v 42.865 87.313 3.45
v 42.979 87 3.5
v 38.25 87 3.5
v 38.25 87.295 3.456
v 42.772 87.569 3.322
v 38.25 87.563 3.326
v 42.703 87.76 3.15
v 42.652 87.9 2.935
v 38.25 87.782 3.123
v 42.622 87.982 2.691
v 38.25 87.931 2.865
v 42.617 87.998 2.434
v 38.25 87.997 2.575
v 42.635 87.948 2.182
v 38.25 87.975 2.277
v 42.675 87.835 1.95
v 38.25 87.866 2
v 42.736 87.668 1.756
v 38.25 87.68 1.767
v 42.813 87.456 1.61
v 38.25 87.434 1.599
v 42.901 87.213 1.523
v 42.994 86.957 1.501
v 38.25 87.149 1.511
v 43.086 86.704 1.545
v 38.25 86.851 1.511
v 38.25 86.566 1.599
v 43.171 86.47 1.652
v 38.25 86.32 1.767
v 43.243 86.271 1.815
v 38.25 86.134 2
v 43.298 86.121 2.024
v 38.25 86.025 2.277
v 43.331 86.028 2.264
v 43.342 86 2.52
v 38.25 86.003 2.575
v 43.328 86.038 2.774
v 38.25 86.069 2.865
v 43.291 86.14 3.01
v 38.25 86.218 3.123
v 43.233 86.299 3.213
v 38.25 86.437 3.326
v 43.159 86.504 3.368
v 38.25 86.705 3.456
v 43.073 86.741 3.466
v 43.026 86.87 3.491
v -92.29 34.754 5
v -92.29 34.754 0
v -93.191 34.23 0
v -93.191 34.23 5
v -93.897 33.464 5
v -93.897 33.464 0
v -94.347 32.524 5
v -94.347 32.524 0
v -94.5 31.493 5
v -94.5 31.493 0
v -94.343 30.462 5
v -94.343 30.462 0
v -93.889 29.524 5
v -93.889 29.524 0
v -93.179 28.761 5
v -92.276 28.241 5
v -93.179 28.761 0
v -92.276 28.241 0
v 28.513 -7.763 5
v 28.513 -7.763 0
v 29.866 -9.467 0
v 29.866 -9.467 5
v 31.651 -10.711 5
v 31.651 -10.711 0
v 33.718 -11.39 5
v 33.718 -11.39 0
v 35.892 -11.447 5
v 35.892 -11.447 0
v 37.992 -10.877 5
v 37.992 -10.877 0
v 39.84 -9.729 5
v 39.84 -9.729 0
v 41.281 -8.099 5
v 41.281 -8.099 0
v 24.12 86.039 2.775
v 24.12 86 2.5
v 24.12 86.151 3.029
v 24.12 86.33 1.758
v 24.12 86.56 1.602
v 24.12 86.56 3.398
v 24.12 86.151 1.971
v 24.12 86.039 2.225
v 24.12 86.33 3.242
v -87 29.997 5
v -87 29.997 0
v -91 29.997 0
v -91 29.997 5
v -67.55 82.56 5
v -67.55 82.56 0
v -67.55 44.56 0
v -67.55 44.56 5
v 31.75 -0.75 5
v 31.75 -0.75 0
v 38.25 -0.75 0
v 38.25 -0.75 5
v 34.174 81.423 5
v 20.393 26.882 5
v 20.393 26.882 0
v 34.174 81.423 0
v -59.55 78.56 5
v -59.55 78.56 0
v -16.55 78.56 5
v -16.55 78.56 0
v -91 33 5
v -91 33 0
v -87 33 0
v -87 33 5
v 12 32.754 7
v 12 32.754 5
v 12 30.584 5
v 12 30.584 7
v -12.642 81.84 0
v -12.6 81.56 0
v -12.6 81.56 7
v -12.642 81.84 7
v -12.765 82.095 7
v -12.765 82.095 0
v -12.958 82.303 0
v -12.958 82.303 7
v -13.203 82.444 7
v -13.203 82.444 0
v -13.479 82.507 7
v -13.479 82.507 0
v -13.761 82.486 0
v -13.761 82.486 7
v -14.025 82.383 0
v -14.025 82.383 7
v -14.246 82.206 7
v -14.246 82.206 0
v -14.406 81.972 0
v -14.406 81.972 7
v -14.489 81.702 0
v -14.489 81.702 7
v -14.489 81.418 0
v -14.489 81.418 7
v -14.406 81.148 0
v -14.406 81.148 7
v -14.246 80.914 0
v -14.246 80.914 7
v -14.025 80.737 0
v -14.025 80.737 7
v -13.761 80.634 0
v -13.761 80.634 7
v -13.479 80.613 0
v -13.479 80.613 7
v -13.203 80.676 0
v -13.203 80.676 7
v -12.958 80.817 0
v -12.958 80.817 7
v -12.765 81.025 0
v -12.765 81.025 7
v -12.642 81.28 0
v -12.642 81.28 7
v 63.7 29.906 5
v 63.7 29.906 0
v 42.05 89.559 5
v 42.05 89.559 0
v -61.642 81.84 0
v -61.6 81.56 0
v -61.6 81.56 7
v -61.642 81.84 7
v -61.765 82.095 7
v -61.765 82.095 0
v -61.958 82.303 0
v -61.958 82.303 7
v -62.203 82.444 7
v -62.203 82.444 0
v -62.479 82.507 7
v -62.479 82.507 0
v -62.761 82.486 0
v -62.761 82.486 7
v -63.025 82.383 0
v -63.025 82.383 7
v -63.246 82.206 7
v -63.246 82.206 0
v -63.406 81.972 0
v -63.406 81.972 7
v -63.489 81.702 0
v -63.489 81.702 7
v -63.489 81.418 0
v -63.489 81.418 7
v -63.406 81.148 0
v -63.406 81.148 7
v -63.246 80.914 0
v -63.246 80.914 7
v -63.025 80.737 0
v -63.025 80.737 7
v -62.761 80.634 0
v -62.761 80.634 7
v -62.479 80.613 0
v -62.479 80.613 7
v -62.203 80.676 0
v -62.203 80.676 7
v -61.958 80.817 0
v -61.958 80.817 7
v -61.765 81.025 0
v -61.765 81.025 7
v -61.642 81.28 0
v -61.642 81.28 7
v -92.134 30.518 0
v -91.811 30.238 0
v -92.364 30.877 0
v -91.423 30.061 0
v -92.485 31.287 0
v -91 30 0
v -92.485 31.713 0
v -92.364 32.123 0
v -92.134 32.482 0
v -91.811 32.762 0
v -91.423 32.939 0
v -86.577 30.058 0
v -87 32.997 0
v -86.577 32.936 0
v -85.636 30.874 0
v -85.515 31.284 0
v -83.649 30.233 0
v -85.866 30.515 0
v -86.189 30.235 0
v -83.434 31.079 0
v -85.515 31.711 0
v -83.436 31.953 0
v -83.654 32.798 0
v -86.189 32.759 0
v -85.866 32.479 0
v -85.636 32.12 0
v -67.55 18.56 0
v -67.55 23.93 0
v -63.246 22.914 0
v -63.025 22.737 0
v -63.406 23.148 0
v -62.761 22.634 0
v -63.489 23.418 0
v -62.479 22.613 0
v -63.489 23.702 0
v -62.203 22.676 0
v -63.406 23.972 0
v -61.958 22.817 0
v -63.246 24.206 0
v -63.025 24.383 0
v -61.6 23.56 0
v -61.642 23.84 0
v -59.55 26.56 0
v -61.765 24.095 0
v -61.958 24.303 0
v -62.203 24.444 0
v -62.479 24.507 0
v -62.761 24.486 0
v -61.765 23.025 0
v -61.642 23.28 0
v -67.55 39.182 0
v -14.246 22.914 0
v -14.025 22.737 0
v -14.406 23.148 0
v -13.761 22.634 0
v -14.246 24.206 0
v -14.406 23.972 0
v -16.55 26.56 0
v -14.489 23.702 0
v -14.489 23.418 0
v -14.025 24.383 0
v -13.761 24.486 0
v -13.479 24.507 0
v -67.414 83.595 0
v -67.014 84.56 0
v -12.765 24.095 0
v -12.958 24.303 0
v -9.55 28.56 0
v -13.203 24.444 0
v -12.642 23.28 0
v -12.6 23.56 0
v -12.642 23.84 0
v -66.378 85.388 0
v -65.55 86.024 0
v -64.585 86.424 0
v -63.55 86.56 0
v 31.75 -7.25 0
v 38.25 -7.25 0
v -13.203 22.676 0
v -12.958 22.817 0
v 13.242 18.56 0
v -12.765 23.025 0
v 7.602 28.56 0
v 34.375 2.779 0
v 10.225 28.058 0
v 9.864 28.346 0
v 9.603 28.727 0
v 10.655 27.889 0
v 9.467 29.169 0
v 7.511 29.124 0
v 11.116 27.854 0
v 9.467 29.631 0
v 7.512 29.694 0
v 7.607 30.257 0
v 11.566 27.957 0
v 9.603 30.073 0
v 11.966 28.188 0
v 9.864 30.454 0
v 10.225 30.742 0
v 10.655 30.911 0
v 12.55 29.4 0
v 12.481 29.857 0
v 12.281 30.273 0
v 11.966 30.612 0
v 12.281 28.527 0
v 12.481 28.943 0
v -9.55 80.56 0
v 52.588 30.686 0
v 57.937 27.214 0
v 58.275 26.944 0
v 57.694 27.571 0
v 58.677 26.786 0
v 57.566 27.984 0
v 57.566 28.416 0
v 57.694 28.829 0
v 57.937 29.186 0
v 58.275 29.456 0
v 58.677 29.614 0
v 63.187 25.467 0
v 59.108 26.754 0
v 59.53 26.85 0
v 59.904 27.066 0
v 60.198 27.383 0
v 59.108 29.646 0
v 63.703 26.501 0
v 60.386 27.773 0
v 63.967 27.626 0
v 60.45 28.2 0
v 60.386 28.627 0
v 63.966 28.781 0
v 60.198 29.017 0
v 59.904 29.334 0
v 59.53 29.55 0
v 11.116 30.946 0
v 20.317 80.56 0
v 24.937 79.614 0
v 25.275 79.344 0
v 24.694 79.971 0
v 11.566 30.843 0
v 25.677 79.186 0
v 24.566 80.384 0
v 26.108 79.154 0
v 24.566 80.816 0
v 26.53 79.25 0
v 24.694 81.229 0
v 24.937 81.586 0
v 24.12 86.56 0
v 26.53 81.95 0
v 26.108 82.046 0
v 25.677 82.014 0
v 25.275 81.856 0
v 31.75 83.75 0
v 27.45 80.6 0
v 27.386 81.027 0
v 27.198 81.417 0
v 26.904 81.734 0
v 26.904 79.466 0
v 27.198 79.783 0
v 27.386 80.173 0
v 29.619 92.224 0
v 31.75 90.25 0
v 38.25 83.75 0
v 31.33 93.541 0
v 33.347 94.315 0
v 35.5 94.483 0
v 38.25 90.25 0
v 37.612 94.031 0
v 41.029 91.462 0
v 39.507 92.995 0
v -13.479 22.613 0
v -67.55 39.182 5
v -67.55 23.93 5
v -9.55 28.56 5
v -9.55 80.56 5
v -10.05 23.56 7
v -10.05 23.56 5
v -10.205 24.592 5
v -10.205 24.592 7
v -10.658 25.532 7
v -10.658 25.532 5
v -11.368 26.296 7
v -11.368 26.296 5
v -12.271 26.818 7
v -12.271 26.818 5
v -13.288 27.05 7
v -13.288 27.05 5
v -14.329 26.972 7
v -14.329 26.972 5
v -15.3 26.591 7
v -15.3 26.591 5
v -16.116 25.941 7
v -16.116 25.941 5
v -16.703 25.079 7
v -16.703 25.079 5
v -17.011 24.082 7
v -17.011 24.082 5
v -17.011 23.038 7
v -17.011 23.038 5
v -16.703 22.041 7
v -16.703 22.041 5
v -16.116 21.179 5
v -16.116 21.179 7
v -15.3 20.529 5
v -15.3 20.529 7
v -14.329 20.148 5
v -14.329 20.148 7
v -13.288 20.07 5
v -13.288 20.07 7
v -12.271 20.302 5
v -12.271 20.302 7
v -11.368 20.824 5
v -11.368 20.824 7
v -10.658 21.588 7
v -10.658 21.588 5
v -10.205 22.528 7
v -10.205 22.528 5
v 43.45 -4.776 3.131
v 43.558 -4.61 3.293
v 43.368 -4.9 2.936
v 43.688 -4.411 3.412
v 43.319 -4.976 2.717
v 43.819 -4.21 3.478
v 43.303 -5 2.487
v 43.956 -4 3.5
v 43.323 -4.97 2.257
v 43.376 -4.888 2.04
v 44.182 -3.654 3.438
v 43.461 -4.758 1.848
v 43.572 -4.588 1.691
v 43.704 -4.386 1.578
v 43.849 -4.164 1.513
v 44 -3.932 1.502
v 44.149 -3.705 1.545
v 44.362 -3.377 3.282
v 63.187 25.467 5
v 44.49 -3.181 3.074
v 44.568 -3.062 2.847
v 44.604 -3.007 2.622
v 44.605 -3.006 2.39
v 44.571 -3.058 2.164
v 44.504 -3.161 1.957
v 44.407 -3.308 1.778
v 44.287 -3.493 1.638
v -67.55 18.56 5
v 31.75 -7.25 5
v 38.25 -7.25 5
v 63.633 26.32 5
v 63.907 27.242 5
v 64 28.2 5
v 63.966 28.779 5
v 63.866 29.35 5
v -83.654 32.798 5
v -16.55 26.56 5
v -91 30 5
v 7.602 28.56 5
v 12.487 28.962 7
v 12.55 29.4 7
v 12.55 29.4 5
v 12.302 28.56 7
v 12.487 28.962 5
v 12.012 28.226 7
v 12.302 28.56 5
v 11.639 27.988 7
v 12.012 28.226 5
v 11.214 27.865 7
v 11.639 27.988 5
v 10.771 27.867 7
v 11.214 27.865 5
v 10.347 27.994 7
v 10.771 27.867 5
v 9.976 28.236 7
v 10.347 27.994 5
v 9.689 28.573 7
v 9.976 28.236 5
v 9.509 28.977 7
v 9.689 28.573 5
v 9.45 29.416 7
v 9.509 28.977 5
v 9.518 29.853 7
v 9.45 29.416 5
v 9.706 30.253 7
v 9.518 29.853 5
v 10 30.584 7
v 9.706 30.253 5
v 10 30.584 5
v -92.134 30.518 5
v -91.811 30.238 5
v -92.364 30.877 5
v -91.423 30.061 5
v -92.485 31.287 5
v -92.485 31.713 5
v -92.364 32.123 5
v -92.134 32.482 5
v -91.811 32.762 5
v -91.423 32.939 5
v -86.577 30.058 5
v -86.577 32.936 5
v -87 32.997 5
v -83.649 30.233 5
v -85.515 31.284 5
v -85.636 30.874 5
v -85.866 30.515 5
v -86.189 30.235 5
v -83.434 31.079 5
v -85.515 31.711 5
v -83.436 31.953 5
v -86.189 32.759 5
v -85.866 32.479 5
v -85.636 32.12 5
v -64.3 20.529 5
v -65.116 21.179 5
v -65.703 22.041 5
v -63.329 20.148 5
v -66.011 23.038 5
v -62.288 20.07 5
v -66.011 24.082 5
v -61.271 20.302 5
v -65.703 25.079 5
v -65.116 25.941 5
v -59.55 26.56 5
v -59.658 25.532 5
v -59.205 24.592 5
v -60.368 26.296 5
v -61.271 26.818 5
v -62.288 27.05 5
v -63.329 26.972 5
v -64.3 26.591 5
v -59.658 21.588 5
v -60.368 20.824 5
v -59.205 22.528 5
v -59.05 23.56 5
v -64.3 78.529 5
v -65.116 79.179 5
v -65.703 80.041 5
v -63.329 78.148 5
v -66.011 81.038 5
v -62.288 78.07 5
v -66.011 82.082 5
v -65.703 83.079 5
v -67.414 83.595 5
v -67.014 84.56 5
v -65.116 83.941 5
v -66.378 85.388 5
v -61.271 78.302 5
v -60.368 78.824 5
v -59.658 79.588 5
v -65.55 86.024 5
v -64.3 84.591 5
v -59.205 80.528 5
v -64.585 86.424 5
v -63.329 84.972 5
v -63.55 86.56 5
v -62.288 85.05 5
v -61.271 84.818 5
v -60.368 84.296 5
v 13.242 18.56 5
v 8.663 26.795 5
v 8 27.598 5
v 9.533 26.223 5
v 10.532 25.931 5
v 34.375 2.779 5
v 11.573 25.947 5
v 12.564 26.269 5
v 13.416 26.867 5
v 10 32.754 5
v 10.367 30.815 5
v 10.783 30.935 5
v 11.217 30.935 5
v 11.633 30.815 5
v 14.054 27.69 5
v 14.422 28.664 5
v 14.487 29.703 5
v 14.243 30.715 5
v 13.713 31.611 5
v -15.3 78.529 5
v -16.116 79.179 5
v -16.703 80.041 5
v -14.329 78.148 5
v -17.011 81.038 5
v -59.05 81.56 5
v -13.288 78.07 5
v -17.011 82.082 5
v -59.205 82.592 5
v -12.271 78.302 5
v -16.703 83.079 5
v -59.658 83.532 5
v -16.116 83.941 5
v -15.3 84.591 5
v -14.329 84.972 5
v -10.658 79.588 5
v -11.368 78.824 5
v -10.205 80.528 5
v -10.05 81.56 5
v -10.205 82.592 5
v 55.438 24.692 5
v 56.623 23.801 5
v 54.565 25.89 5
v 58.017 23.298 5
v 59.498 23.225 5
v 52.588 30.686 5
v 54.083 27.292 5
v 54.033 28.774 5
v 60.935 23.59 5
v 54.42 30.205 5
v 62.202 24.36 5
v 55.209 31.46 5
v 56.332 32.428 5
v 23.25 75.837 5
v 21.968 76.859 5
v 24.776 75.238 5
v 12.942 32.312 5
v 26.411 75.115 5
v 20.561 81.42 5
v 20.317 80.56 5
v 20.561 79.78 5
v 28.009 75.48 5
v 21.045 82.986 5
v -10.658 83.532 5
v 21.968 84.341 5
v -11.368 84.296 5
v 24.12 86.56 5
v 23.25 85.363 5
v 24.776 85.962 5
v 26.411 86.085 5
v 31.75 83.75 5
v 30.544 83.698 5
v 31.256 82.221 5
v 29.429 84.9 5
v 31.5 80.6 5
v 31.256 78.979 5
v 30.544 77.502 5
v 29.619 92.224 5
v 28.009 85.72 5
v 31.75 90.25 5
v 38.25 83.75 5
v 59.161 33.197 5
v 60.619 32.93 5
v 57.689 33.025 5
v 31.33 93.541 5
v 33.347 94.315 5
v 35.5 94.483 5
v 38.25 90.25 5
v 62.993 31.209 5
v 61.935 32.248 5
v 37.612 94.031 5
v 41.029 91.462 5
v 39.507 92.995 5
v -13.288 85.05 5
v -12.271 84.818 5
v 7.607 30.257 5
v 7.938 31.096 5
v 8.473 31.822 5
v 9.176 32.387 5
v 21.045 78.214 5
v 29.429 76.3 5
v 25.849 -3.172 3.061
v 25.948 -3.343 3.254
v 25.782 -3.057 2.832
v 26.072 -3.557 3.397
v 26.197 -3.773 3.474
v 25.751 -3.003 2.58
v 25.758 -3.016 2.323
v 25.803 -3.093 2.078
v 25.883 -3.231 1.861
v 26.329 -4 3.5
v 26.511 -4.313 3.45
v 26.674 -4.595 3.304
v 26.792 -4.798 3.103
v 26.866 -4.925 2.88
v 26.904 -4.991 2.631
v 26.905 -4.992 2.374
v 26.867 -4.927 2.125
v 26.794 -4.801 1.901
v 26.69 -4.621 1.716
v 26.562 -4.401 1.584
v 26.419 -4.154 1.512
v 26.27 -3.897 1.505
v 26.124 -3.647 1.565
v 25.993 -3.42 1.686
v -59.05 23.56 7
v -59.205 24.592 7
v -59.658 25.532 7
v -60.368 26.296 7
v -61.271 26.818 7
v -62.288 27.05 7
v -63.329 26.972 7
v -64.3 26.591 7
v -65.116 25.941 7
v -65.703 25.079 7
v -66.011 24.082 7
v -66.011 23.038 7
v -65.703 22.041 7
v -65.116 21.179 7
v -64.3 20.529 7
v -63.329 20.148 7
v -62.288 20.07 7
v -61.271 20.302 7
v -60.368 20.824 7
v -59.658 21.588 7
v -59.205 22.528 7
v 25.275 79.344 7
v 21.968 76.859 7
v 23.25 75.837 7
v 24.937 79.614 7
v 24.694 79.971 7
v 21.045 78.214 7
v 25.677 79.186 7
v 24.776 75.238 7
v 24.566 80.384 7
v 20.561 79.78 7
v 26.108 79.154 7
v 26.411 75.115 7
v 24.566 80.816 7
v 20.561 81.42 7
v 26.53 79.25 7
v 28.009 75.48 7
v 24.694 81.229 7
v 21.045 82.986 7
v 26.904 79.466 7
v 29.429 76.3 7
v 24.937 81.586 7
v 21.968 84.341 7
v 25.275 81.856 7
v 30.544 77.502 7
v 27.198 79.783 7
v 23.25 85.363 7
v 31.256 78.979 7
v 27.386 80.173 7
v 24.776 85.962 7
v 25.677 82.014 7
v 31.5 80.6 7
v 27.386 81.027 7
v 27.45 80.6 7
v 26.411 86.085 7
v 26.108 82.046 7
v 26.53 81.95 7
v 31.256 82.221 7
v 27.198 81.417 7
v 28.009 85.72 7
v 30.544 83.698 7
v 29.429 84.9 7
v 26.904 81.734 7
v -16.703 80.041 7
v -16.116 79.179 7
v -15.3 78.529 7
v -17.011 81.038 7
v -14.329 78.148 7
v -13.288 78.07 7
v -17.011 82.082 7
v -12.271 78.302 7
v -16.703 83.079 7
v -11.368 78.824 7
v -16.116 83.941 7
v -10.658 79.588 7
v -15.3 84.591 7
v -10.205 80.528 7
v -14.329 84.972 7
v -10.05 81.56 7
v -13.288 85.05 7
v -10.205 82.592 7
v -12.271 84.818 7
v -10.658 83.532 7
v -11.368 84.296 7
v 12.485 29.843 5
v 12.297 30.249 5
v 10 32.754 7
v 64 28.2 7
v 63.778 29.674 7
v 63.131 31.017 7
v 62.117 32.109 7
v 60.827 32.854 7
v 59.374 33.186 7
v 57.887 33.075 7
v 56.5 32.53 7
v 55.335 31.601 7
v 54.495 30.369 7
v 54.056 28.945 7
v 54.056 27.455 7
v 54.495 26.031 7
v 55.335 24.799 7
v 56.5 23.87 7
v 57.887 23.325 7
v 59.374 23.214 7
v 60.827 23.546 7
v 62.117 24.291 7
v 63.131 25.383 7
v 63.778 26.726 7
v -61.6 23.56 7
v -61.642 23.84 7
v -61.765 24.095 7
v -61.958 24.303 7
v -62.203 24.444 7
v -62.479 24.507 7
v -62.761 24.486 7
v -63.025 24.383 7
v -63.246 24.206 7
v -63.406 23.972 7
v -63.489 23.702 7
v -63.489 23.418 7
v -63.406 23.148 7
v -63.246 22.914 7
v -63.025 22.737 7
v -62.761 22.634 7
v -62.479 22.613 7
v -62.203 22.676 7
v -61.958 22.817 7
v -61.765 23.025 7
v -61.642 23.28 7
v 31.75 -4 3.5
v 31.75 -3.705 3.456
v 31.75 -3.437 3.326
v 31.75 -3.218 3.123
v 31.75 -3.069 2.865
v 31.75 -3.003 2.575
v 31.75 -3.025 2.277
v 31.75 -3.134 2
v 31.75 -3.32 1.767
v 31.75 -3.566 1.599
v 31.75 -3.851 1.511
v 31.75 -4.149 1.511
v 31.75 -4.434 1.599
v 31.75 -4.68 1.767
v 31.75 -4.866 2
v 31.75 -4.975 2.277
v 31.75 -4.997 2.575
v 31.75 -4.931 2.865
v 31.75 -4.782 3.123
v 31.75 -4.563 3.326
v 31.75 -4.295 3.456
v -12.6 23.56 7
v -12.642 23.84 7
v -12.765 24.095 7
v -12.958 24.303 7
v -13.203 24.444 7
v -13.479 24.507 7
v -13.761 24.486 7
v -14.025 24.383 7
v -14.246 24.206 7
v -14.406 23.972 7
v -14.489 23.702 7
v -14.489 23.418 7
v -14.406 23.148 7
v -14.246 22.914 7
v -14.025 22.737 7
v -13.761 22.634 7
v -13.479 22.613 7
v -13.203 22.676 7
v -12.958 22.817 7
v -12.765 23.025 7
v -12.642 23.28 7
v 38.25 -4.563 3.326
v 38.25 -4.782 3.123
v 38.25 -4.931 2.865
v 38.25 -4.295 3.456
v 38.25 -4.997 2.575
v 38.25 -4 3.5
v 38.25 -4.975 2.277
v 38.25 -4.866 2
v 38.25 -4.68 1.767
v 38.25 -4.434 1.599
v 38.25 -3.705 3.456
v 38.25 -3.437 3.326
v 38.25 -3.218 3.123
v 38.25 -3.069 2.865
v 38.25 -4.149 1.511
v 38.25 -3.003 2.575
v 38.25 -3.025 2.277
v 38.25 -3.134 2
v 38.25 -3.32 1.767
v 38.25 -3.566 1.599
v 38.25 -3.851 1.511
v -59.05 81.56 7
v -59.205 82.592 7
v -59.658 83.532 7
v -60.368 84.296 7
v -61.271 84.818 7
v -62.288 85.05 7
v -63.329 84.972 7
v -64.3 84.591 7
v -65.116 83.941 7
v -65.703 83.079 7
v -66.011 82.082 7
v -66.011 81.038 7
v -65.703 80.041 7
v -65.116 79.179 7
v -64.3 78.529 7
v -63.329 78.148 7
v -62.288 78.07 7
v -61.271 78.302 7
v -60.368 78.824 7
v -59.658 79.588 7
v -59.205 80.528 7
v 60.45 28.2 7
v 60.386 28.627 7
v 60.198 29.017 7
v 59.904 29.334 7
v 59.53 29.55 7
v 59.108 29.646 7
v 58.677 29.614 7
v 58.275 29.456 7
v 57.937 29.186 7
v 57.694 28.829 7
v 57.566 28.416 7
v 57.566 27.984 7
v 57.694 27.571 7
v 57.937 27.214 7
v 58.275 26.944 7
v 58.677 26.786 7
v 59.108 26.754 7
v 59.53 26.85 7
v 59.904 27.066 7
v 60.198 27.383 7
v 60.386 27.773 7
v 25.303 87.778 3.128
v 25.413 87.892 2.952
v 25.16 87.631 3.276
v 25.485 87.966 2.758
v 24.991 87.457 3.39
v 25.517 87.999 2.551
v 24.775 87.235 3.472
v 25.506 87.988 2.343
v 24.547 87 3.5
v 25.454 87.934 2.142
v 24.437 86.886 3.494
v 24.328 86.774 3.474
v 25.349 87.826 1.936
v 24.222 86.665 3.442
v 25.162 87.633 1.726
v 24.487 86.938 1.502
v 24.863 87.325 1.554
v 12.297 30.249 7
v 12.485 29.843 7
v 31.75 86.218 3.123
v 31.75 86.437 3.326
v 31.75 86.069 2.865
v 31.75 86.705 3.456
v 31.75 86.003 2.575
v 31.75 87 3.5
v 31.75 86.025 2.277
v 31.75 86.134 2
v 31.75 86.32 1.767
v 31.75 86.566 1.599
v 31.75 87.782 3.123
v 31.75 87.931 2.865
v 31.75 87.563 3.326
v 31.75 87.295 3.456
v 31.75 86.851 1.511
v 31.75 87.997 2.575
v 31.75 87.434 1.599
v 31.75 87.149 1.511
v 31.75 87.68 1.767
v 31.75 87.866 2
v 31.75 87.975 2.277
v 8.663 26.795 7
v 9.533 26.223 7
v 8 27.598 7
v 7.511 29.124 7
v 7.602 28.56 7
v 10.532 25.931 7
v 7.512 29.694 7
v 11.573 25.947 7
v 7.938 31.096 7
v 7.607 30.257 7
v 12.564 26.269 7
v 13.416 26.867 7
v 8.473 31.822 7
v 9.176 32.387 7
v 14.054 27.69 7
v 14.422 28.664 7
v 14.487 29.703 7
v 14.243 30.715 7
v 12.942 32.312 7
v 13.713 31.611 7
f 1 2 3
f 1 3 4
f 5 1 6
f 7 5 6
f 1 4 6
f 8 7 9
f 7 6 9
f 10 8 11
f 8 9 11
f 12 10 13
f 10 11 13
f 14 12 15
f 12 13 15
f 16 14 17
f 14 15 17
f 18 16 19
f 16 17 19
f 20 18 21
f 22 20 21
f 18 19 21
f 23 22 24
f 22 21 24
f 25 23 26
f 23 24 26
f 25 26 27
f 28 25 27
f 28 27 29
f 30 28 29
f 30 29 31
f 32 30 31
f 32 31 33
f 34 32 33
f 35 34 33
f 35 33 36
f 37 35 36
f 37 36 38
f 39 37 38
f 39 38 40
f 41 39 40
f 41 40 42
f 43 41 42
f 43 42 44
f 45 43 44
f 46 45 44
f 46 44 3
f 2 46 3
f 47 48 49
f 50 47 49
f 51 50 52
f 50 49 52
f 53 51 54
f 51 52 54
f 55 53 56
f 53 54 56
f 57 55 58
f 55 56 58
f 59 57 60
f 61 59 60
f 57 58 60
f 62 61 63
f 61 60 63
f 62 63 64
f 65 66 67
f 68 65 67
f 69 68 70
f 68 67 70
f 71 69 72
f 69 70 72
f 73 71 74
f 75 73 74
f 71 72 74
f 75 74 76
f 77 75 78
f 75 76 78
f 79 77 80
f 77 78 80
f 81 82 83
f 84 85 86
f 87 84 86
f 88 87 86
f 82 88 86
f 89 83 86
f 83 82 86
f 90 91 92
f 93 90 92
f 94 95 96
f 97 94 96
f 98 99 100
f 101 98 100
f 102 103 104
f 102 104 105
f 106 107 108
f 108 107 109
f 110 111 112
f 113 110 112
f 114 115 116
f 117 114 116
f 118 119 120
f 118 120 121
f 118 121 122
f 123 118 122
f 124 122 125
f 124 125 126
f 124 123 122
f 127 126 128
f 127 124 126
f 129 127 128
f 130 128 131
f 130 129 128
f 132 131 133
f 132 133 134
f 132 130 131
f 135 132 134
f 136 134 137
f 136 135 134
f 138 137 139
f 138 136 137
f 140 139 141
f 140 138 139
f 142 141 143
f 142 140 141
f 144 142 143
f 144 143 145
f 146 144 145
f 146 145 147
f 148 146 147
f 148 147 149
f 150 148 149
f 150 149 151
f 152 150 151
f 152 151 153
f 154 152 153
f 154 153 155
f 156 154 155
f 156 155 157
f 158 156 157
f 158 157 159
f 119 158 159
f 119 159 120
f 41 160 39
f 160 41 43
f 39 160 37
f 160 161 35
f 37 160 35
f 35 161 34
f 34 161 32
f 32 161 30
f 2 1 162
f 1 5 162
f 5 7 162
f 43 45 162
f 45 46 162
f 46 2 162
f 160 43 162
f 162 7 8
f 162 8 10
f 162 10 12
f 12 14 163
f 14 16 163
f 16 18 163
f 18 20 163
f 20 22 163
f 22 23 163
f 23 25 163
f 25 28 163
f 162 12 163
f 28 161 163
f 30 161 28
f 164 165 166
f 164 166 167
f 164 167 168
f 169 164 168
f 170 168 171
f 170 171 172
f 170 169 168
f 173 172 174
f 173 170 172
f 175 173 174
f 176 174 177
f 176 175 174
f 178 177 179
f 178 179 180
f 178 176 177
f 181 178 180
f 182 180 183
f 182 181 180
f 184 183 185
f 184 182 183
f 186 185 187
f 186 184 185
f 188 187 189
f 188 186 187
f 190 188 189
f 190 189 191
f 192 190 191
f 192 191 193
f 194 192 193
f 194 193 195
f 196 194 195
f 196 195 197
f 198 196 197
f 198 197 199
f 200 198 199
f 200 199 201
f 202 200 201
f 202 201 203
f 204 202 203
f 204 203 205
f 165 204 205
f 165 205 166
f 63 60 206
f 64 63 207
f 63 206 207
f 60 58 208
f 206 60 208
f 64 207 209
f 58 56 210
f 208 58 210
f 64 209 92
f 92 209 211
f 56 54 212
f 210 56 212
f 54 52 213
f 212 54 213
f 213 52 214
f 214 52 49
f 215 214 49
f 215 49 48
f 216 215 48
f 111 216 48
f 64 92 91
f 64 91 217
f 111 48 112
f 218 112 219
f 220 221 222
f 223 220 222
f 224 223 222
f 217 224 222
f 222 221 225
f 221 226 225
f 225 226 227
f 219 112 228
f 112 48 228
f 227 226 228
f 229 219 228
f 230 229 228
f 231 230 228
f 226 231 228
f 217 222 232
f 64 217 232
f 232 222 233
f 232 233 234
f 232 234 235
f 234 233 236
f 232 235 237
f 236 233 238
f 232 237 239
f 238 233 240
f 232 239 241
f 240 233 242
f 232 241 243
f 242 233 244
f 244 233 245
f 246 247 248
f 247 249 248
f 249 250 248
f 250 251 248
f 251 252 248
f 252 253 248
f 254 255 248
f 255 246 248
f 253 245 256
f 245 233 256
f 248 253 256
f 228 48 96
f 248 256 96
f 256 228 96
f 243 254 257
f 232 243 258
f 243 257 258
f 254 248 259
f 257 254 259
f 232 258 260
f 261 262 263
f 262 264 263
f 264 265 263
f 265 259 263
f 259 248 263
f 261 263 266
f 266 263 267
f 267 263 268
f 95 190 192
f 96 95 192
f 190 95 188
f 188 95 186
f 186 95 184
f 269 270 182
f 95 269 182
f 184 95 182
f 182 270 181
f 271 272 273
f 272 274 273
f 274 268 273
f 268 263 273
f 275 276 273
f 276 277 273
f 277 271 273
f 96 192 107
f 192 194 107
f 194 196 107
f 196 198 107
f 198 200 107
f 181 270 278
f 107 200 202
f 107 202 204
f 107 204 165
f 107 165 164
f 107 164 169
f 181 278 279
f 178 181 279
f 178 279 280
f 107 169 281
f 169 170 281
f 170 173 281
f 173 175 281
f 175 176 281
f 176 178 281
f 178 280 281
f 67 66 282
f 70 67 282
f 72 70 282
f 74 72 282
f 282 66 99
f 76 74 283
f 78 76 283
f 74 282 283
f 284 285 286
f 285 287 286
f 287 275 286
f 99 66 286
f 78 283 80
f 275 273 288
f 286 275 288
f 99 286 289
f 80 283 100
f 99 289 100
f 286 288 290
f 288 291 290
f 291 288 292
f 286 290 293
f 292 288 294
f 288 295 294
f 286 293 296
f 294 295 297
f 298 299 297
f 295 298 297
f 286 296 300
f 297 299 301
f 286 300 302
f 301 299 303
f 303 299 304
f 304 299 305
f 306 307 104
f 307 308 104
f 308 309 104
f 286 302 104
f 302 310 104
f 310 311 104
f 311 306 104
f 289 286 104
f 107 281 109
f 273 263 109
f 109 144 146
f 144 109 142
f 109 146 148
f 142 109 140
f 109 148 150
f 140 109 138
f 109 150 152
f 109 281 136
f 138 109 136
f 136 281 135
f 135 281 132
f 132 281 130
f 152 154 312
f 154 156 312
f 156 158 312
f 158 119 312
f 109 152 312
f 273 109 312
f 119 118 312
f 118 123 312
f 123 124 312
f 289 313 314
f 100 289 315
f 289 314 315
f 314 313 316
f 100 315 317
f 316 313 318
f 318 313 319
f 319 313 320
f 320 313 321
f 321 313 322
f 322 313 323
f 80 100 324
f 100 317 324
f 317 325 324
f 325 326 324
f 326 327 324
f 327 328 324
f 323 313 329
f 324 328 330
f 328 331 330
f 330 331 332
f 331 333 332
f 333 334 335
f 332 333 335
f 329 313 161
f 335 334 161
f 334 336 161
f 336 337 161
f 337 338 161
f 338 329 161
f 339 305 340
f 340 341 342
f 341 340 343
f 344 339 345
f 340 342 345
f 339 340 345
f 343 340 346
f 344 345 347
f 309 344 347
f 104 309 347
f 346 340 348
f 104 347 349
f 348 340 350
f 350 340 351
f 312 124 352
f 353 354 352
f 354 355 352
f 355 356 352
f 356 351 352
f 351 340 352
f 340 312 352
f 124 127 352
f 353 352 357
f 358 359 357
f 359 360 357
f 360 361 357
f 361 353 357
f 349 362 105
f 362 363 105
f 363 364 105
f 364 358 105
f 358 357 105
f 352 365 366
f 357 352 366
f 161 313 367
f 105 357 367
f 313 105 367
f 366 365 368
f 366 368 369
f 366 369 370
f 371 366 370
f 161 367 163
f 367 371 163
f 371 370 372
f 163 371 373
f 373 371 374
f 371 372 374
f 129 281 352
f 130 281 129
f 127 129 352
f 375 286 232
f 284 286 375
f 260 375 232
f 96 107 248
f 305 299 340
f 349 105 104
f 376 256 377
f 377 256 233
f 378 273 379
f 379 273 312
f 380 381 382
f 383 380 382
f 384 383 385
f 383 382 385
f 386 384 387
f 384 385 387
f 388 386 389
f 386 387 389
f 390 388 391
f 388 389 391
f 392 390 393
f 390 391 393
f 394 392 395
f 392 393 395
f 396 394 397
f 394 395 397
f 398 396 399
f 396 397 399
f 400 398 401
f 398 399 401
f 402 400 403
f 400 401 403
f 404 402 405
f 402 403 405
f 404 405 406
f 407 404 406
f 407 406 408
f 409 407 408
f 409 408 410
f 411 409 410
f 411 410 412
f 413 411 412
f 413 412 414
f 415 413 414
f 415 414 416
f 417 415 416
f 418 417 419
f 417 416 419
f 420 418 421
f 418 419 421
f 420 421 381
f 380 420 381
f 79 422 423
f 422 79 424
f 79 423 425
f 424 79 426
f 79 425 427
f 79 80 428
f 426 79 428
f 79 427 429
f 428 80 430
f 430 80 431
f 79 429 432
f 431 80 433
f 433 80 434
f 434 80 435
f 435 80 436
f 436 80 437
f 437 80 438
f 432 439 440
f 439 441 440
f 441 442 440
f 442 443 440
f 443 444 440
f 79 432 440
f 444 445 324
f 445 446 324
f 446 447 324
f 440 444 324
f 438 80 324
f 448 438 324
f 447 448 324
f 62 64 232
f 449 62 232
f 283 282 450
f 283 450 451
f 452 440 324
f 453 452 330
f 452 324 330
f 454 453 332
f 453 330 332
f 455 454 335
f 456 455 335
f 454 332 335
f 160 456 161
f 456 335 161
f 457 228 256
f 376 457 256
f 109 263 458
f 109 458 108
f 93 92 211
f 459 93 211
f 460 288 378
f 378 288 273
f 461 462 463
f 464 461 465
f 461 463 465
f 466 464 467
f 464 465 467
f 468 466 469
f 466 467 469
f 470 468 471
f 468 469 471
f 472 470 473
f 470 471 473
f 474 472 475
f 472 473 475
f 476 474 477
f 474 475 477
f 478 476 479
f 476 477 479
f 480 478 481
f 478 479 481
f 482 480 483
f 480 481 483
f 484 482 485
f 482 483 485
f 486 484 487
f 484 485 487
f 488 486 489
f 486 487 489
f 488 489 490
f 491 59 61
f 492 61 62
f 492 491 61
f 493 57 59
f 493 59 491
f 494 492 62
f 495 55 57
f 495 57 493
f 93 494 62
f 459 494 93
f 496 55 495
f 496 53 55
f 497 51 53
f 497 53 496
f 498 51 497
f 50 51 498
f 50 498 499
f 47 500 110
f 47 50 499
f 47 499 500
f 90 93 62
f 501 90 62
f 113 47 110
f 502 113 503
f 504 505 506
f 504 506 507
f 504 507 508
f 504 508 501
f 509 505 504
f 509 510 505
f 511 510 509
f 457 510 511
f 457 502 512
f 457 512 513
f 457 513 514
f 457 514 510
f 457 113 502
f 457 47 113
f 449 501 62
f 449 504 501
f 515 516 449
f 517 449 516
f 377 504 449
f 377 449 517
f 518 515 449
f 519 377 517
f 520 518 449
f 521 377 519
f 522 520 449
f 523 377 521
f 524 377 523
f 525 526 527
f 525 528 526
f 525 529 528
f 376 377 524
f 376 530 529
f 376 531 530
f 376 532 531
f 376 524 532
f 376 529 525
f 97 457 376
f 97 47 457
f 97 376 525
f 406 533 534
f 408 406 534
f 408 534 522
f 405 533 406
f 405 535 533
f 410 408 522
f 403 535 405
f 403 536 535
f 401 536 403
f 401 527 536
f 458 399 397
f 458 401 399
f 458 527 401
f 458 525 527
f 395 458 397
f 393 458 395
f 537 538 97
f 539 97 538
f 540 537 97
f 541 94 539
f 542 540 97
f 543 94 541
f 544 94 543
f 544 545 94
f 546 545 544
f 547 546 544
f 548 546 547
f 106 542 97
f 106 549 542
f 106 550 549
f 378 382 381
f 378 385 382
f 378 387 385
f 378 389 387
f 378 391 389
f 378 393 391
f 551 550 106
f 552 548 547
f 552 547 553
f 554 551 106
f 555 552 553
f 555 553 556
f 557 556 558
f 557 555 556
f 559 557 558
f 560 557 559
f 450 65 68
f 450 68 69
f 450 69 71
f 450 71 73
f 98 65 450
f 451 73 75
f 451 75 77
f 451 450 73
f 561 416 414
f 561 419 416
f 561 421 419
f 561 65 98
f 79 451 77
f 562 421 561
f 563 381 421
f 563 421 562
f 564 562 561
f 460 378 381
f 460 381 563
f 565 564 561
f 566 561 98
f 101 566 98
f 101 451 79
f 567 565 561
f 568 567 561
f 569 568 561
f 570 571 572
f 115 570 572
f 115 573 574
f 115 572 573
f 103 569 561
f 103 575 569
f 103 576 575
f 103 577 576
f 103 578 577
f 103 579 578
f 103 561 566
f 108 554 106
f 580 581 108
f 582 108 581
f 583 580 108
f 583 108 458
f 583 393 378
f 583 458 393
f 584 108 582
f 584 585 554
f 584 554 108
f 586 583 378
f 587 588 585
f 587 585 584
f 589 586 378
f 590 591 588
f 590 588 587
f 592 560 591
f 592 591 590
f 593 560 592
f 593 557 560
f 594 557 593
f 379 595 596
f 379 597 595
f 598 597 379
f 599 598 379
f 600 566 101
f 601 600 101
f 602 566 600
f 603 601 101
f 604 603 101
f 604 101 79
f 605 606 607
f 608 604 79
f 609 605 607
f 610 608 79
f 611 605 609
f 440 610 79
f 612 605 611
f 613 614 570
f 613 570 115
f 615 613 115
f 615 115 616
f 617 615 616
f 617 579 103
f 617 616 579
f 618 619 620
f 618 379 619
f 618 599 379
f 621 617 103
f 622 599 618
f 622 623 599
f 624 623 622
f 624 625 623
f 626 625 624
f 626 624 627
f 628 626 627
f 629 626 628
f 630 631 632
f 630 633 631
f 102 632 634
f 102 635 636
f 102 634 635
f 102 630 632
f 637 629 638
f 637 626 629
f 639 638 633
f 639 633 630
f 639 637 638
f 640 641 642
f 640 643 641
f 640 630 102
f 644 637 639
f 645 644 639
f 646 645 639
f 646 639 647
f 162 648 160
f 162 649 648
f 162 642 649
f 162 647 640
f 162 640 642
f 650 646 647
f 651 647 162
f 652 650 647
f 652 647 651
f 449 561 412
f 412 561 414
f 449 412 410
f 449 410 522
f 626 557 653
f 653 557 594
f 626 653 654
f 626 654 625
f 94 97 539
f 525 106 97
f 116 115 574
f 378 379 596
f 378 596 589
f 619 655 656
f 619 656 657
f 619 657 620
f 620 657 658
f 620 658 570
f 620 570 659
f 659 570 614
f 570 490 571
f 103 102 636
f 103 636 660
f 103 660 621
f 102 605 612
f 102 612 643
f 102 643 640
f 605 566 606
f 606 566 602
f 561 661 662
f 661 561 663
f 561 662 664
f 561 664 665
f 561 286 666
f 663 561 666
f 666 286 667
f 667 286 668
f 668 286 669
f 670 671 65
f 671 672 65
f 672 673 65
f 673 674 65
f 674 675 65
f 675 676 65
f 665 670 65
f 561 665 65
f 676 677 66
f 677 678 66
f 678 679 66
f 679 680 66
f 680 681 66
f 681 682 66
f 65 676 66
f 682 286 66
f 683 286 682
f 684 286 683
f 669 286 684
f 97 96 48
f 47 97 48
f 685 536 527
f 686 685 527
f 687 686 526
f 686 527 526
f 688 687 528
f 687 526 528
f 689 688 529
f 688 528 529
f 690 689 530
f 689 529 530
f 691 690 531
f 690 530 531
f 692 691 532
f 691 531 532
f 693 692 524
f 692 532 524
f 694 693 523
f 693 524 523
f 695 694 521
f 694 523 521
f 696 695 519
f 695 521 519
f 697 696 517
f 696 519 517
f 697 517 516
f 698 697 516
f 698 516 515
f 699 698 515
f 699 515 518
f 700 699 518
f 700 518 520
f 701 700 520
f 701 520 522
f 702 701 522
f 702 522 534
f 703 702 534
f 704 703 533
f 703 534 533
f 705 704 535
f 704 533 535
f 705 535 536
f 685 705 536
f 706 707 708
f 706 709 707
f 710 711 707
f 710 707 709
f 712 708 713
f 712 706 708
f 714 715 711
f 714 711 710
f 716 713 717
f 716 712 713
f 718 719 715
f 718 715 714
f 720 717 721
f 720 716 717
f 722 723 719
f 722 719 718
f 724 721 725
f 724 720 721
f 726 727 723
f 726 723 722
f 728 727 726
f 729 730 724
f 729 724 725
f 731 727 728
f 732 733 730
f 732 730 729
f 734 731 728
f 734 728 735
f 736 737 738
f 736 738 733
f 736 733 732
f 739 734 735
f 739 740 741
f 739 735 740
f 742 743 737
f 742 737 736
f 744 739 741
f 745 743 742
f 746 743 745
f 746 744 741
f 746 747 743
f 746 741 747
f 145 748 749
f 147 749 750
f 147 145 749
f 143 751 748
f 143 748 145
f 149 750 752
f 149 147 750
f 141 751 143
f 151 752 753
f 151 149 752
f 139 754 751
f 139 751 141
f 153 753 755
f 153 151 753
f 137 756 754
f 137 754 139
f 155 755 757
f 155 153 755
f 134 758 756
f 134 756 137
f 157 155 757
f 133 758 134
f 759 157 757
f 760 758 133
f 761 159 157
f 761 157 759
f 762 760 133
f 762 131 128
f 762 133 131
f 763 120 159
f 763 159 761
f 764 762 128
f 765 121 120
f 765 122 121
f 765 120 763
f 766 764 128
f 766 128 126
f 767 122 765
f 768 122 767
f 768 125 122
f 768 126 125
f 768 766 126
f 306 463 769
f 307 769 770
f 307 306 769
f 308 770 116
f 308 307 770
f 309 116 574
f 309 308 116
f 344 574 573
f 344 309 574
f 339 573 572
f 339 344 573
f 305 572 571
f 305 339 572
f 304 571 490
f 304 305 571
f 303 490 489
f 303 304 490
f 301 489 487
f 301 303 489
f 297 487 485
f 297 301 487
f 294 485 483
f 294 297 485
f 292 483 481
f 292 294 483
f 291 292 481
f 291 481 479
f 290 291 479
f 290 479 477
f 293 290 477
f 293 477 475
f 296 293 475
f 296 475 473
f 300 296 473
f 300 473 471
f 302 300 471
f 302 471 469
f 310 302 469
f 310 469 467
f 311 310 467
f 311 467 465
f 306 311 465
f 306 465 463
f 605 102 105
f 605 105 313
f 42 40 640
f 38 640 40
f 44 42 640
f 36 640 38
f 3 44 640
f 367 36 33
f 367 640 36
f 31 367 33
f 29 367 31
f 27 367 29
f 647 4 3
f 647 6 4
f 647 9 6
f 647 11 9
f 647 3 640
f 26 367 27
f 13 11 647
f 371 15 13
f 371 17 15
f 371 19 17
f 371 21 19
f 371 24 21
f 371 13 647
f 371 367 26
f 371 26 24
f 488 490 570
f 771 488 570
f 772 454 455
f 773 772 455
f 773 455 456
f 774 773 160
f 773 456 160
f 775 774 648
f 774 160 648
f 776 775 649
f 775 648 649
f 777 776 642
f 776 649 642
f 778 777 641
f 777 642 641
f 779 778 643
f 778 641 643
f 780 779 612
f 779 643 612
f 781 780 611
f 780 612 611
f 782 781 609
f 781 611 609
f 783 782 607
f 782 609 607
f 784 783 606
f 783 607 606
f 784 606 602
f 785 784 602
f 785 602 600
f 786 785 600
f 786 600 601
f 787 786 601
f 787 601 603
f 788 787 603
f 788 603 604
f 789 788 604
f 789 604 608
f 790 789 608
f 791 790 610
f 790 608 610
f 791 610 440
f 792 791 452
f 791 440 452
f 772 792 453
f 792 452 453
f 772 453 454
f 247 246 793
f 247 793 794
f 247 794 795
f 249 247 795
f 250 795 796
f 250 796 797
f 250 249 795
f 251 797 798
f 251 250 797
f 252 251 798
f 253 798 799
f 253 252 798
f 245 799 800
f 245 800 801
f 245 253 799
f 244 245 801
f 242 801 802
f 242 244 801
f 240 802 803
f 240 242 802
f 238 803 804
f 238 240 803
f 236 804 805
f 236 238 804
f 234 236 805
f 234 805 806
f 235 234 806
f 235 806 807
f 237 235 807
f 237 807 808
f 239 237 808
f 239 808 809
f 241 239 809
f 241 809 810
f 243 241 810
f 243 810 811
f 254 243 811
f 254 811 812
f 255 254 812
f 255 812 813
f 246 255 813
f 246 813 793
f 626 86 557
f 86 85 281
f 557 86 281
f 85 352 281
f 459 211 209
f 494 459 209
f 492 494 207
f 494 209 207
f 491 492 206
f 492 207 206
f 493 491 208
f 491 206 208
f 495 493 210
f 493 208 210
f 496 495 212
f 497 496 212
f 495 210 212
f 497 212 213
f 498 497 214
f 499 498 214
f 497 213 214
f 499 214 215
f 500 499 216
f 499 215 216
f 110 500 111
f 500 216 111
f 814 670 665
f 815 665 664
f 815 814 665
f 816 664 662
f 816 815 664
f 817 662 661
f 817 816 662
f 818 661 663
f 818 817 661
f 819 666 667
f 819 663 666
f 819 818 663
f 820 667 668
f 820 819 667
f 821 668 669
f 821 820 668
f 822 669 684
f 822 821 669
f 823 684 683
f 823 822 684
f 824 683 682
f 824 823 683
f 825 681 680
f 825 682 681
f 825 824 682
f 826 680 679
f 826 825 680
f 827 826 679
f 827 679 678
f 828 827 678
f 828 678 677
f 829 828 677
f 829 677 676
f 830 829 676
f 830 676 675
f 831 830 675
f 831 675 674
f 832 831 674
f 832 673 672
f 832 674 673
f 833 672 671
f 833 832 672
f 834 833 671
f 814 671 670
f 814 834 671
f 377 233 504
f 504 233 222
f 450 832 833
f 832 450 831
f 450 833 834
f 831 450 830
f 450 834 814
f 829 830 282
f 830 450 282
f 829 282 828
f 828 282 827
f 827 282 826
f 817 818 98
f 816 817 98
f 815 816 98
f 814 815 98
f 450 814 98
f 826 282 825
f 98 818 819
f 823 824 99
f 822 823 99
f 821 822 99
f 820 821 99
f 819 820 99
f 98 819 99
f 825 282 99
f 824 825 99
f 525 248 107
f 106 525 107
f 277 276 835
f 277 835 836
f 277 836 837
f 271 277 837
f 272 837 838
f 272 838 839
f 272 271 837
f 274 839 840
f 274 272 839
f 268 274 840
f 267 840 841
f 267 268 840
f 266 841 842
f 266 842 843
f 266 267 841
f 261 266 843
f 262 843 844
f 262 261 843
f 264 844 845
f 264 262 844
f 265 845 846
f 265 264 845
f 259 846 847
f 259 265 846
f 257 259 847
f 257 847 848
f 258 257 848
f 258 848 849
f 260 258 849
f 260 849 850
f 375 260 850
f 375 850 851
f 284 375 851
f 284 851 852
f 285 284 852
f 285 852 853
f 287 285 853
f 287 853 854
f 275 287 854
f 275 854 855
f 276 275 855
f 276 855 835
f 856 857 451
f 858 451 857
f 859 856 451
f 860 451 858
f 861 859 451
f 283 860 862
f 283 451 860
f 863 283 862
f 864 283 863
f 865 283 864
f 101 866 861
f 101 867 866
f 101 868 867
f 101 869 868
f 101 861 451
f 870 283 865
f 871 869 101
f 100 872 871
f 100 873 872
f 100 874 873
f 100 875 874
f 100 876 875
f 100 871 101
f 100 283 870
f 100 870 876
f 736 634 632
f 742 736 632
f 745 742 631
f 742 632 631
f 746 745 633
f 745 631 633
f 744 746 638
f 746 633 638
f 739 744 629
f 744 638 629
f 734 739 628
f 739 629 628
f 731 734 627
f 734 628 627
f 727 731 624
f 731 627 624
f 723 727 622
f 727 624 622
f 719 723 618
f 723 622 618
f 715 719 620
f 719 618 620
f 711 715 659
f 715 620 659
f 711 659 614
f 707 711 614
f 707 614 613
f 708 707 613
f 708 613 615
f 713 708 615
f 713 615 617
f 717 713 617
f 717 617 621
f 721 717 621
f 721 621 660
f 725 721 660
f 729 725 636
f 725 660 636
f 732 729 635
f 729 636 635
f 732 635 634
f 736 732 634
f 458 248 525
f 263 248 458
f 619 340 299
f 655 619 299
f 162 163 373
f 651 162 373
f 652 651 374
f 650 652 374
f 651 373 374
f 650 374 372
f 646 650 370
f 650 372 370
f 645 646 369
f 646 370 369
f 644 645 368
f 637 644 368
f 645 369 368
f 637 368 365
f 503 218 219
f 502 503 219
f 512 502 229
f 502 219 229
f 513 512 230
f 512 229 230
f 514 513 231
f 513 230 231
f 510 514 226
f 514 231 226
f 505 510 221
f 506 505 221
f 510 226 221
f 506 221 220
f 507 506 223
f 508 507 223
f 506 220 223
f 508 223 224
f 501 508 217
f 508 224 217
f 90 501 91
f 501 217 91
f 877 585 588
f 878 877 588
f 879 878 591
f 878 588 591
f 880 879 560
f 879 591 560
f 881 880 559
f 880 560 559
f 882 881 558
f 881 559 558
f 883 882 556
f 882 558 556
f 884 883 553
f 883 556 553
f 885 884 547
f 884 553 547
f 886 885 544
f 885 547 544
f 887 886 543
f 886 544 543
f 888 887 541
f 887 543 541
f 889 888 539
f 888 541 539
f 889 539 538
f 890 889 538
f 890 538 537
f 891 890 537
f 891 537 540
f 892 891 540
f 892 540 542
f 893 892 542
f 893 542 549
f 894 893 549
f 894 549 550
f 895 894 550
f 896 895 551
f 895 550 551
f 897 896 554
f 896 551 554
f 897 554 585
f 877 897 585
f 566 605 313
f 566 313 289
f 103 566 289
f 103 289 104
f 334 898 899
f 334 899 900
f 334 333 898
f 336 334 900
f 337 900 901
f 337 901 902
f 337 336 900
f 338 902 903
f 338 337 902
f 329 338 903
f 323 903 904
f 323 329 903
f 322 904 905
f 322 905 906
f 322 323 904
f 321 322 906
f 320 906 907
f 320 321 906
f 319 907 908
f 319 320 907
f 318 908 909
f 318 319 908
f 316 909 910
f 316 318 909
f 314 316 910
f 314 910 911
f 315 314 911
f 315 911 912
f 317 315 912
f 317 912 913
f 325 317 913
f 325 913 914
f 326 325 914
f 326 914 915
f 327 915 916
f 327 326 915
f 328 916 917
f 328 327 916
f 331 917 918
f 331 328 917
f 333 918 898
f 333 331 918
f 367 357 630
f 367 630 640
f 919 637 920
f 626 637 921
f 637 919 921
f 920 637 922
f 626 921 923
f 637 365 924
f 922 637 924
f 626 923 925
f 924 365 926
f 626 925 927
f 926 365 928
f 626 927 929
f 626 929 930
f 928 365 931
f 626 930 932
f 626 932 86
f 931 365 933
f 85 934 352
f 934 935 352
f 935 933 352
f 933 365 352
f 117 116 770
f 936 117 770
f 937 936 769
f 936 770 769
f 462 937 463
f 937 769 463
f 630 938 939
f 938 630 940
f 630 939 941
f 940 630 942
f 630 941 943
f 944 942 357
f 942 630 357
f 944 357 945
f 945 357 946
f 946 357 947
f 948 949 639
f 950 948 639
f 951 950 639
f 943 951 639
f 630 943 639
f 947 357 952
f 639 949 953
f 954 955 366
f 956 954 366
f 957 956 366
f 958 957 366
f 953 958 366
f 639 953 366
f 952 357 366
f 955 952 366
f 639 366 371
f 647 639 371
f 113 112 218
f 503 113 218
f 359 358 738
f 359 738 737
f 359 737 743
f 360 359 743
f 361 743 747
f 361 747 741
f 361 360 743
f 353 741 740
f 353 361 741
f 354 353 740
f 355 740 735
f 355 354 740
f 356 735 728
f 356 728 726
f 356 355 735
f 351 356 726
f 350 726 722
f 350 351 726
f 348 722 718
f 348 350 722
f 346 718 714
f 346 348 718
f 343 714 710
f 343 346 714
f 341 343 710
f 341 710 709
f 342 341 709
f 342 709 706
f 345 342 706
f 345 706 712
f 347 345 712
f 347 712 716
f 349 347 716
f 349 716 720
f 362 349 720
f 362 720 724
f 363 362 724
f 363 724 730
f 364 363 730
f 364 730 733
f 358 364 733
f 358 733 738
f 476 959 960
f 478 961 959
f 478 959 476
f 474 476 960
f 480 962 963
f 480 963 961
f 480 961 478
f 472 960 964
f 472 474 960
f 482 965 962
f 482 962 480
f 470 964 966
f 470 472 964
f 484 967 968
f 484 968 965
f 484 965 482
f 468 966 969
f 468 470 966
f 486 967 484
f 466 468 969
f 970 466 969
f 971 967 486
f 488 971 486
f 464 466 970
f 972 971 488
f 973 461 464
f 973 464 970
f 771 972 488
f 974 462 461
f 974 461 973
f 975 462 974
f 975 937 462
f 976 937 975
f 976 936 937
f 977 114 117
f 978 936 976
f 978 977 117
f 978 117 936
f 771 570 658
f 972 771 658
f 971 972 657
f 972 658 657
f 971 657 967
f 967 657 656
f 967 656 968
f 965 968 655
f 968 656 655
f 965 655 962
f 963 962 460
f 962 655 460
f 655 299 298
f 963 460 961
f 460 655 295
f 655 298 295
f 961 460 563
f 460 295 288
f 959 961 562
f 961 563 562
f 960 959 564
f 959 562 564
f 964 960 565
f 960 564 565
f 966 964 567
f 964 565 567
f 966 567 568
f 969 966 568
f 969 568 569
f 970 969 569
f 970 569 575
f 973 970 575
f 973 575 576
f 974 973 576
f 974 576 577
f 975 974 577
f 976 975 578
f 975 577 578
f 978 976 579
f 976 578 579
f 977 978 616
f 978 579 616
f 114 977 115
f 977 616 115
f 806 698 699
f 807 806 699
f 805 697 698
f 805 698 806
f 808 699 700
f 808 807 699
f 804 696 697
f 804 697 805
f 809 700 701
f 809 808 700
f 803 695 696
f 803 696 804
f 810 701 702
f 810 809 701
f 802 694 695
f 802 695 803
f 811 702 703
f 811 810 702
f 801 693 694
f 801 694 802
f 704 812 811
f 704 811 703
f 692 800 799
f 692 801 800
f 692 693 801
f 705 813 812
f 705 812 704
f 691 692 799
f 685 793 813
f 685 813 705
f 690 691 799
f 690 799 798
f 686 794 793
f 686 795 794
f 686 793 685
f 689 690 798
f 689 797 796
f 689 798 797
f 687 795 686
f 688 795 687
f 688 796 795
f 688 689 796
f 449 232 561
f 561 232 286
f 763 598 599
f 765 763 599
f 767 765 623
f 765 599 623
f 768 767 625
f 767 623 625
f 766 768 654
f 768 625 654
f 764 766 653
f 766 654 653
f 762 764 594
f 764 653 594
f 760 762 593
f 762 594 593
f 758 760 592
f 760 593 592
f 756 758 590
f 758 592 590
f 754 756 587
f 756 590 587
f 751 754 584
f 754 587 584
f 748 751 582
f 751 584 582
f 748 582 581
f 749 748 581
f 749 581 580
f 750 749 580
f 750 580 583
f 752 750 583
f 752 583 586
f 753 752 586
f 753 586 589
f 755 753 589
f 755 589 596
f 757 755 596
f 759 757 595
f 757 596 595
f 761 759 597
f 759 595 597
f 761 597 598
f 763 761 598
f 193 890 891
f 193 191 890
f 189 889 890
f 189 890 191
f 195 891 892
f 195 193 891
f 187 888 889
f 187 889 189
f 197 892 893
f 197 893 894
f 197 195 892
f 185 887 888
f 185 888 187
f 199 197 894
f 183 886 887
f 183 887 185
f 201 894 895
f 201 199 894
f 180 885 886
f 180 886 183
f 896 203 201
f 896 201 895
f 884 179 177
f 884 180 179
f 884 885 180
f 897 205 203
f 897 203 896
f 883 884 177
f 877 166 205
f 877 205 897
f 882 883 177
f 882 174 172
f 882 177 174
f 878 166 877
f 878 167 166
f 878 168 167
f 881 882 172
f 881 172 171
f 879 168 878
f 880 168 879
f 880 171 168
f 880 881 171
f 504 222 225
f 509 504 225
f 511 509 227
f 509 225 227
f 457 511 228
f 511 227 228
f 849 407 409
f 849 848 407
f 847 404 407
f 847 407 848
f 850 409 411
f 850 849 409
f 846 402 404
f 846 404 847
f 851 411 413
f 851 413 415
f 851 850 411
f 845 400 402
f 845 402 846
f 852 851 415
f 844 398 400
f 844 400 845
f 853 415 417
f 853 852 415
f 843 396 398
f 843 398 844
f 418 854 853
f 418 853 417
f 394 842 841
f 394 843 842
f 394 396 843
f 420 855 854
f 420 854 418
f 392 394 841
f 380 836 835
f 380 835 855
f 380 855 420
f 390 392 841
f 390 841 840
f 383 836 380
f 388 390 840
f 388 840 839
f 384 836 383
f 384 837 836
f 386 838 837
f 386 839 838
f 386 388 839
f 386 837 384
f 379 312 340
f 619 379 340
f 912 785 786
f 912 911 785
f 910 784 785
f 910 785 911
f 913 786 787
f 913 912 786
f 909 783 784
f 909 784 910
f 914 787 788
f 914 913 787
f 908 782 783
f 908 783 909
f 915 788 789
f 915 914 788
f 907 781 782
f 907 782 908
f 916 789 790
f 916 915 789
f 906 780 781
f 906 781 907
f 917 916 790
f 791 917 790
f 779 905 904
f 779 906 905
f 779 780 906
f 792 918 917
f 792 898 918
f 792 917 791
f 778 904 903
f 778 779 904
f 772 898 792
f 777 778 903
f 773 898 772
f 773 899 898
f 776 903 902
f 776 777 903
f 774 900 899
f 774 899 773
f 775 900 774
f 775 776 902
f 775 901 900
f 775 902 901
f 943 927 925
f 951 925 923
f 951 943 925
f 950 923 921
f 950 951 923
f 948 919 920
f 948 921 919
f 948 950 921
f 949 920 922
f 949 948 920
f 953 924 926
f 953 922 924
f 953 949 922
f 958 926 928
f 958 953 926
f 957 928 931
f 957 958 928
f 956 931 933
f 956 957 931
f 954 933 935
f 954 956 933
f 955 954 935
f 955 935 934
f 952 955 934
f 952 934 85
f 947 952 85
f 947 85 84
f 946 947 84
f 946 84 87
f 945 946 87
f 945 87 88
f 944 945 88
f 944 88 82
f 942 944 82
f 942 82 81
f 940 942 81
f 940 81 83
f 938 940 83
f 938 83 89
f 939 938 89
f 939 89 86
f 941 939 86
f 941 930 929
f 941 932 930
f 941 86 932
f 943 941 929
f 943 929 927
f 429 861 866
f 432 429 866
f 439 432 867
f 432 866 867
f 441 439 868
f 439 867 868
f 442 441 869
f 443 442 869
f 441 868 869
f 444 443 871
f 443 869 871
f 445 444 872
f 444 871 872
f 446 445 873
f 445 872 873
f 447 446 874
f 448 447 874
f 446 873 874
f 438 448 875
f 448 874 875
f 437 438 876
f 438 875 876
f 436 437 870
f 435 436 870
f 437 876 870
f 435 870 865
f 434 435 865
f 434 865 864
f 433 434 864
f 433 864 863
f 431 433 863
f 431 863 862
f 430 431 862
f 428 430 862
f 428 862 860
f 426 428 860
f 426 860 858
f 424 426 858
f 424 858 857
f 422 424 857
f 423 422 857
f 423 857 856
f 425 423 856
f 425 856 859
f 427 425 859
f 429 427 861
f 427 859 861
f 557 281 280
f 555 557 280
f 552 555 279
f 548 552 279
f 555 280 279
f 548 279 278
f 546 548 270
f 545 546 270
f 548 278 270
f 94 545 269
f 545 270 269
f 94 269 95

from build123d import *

# Parameters (mm, degrees)
SKETCH1_R               = 0.95
SKETCH1_W               = 6.5
SKETCH1_H               = 6.5
SKETCH1_R_2             = 1.55
SKETCH1_R_3             = 1.45
SKETCH1_W_2             = 43
SKETCH1_H_2             = 52
BOSS_EXTRUDE1_DEPTH     = 5
SKETCH3_R               = 5
SKETCH3_R_2             = 1.45
SKETCH3_R_3             = 5.5
SKETCH3_R_4             = 3.5
SKETCH3_R_5             = 0.95
BOSS_EXTRUDE3_DEPTH     = 2
CUT_EXTRUDE1_DEPTH      = 10
SKETCH6_R               = 1
CUT_EXTRUDE2_DEPTH      = 14.13
CUT_EXTRUDE2_DEPTH_BACK = 10


with BuildPart() as part:
    # Sketch1 → Boss-Extrude1 (new body)
    with BuildSketch(Plane.XY):
        with BuildLine():
            Line((13.24210093, 18.56), (28.512575376, -7.763418891))
            ThreePointArc((28.512575376, -7.763418891), (34.802937336, -11.49741064), (41.280767541, -8.099019285))
            Line((41.280767541, -8.099019285), (63.187178361, 25.467320477))
            ThreePointArc((63.187178361, 25.467320477), (63.966953059, 27.626085973), (63.700028418, 29.905793912))
            Line((63.700028418, 29.905793912), (42.050042627, 89.558690868))
            ThreePointArc((42.050042627, 89.558690868), (36.572238317, 94.333353031), (29.618521803, 92.223953715))
            Line((29.618521803, 92.223953715), (24.120361081, 86.56))
            Line((24.120361081, 86.56), (-63.55, 86.56))
            ThreePointArc((-63.55, 86.56), (-66.378427125, 85.388427125), (-67.55, 82.56))
            Line((-67.55, 82.56), (-67.55, 44.56))
            Line((-67.55, 44.56), (-92.289702732, 34.753715855))
            ThreePointArc((-92.289702732, 34.753715855), (-94.499992282, 31.492649998), (-92.276025776, 28.240896102))
            Line((-92.276025776, 28.240896102), (-67.55, 18.56))
            Line((-67.55, 18.56), (13.24210093, 18.56))
        make_face()
        with Locations((-62.55, 23.56)):
            Circle(SKETCH1_R, mode=Mode.SUBTRACT)
        with BuildLine():
            ThreePointArc((-87, 32.997152184), (-85.5, 31.497152184), (-87, 29.997152184))
            Line((-87, 29.997152184), (-91, 29.997152184))
            Line((-91, 29.997152184), (-91, 30))
            ThreePointArc((-91, 30), (-92.5, 31.5), (-91, 33))
            Line((-91, 33), (-87, 33))
            Line((-87, 33), (-87, 32.997152184))
        make_face(mode=Mode.SUBTRACT)
        with BuildLine():
            Line((-67.55, 23.929574136), (-83.648509217, 30.232568258))
            ThreePointArc((-83.648509217, 30.232568258), (-83.407620833, 31.515944037), (-83.65389726, 32.798296766))
            Line((-83.65389726, 32.798296766), (-67.55, 39.18153403))
            Line((-67.55, 39.18153403), (-67.55, 23.929574136))
        make_face(mode=Mode.SUBTRACT)
        with Locations((35, -4)):
            Rectangle(SKETCH1_W, SKETCH1_H, mode=Mode.SUBTRACT)
        with Locations((11, 29.4)):
            Circle(SKETCH1_R_2, mode=Mode.SUBTRACT)
        with Locations((59, 28.2)):
            Circle(SKETCH1_R_3, mode=Mode.SUBTRACT)
        with Locations((-38.05, 52.56)):
            Rectangle(SKETCH1_W_2, SKETCH1_H_2, mode=Mode.SUBTRACT)
        with Locations((-62.55, 81.56)):
            Circle(SKETCH1_R, mode=Mode.SUBTRACT)
        with BuildLine():
            ThreePointArc((7.606653519, 30.257437846), (7.500011538, 29.408987159), (7.602294892, 28.56))
            Line((7.602294892, 28.56), (-9.55, 28.56))
            Line((-9.55, 28.56), (-9.55, 80.56))
            Line((-9.55, 80.56), (20.317209538, 80.56))
            Line((20.317209538, 80.56), (7.606653519, 30.257437846))
        make_face(mode=Mode.SUBTRACT)
        with Locations((-13.55, 81.56)):
            Circle(SKETCH1_R, mode=Mode.SUBTRACT)
        with Locations((26, 80.6)):
            Circle(SKETCH1_R_3, mode=Mode.SUBTRACT)
        with Locations((35, 87)):
            Rectangle(SKETCH1_W, SKETCH1_H, mode=Mode.SUBTRACT)
        with Locations((-13.55, 23.56)):
            Circle(SKETCH1_R, mode=Mode.SUBTRACT)
    extrude(amount=BOSS_EXTRUDE1_DEPTH)

    # Sketch3 → Boss-Extrude3 (add)
    with BuildSketch(Plane.XY.offset(5)):
        with Locations((59, 28.2)):
            Circle(SKETCH3_R)
        with Locations((59, 28.2)):
            Circle(SKETCH3_R_2, mode=Mode.SUBTRACT)
        with Locations((26, 80.6)):
            Circle(SKETCH3_R_3)
        with Locations((26, 80.6)):
            Circle(SKETCH3_R_2, mode=Mode.SUBTRACT)
        with BuildLine():
            ThreePointArc((12.55, 29.4), (10.347121757, 27.994208408), (10, 30.584271928))
            Line((10, 30.584271928), (10, 32.754101966))
            ThreePointArc((10, 32.754101966), (8.473400258, 31.822043299), (7.606653519, 30.257437846))
            ThreePointArc((7.606653519, 30.257437846), (7.500011538, 29.408987159), (7.602294892, 28.56))
            ThreePointArc((7.602294892, 28.56), (13.415547613, 26.867189362), (12, 32.754101966))
            Line((12, 32.754101966), (12, 30.584271928))
            ThreePointArc((12, 30.584271928), (12.405791592, 30.052878243), (12.55, 29.4))
        make_face()
        with Locations((-13.55, 23.56)):
            Circle(SKETCH3_R_4)
        with Locations((-13.55, 23.56)):
            Circle(SKETCH3_R_5, mode=Mode.SUBTRACT)
        with Locations((-62.55, 23.56)):
            Circle(SKETCH3_R_4)
        with Locations((-62.55, 23.56)):
            Circle(SKETCH3_R_5, mode=Mode.SUBTRACT)
        with Locations((-62.55, 81.56)):
            Circle(SKETCH3_R_4)
        with Locations((-62.55, 81.56)):
            Circle(SKETCH3_R_5, mode=Mode.SUBTRACT)
        with Locations((-13.55, 81.56)):
            Circle(SKETCH3_R_4)
        with Locations((-13.55, 81.56)):
            Circle(SKETCH3_R_5, mode=Mode.SUBTRACT)
    extrude(amount=BOSS_EXTRUDE3_DEPTH)

    # Sketch4 → Cut-Extrude1 (cut)
    with BuildSketch(Plane.XY.offset(5)):
        Polygon((34.174437675, 81.42265859), (52.588350326, 30.686217258), (34.375314724, 2.779092439), (20.392987639, 26.881988144), align=None)
    extrude(amount=-CUT_EXTRUDE1_DEPTH, mode=Mode.SUBTRACT)

    # Sketch6 → Cut-Extrude2 (cut, two sides)
    with BuildSketch(Plane.ZY.offset(-38.25)) as cut_extrude2_sk:
        with Locations((2.5, -4)):
            Circle(SKETCH6_R)
        with Locations((2.5, 87)):
            Circle(SKETCH6_R)
    extrude(amount=CUT_EXTRUDE2_DEPTH, mode=Mode.SUBTRACT)
    extrude(cut_extrude2_sk.sketch, amount=-CUT_EXTRUDE2_DEPTH_BACK, mode=Mode.SUBTRACT)


solid = part.part
